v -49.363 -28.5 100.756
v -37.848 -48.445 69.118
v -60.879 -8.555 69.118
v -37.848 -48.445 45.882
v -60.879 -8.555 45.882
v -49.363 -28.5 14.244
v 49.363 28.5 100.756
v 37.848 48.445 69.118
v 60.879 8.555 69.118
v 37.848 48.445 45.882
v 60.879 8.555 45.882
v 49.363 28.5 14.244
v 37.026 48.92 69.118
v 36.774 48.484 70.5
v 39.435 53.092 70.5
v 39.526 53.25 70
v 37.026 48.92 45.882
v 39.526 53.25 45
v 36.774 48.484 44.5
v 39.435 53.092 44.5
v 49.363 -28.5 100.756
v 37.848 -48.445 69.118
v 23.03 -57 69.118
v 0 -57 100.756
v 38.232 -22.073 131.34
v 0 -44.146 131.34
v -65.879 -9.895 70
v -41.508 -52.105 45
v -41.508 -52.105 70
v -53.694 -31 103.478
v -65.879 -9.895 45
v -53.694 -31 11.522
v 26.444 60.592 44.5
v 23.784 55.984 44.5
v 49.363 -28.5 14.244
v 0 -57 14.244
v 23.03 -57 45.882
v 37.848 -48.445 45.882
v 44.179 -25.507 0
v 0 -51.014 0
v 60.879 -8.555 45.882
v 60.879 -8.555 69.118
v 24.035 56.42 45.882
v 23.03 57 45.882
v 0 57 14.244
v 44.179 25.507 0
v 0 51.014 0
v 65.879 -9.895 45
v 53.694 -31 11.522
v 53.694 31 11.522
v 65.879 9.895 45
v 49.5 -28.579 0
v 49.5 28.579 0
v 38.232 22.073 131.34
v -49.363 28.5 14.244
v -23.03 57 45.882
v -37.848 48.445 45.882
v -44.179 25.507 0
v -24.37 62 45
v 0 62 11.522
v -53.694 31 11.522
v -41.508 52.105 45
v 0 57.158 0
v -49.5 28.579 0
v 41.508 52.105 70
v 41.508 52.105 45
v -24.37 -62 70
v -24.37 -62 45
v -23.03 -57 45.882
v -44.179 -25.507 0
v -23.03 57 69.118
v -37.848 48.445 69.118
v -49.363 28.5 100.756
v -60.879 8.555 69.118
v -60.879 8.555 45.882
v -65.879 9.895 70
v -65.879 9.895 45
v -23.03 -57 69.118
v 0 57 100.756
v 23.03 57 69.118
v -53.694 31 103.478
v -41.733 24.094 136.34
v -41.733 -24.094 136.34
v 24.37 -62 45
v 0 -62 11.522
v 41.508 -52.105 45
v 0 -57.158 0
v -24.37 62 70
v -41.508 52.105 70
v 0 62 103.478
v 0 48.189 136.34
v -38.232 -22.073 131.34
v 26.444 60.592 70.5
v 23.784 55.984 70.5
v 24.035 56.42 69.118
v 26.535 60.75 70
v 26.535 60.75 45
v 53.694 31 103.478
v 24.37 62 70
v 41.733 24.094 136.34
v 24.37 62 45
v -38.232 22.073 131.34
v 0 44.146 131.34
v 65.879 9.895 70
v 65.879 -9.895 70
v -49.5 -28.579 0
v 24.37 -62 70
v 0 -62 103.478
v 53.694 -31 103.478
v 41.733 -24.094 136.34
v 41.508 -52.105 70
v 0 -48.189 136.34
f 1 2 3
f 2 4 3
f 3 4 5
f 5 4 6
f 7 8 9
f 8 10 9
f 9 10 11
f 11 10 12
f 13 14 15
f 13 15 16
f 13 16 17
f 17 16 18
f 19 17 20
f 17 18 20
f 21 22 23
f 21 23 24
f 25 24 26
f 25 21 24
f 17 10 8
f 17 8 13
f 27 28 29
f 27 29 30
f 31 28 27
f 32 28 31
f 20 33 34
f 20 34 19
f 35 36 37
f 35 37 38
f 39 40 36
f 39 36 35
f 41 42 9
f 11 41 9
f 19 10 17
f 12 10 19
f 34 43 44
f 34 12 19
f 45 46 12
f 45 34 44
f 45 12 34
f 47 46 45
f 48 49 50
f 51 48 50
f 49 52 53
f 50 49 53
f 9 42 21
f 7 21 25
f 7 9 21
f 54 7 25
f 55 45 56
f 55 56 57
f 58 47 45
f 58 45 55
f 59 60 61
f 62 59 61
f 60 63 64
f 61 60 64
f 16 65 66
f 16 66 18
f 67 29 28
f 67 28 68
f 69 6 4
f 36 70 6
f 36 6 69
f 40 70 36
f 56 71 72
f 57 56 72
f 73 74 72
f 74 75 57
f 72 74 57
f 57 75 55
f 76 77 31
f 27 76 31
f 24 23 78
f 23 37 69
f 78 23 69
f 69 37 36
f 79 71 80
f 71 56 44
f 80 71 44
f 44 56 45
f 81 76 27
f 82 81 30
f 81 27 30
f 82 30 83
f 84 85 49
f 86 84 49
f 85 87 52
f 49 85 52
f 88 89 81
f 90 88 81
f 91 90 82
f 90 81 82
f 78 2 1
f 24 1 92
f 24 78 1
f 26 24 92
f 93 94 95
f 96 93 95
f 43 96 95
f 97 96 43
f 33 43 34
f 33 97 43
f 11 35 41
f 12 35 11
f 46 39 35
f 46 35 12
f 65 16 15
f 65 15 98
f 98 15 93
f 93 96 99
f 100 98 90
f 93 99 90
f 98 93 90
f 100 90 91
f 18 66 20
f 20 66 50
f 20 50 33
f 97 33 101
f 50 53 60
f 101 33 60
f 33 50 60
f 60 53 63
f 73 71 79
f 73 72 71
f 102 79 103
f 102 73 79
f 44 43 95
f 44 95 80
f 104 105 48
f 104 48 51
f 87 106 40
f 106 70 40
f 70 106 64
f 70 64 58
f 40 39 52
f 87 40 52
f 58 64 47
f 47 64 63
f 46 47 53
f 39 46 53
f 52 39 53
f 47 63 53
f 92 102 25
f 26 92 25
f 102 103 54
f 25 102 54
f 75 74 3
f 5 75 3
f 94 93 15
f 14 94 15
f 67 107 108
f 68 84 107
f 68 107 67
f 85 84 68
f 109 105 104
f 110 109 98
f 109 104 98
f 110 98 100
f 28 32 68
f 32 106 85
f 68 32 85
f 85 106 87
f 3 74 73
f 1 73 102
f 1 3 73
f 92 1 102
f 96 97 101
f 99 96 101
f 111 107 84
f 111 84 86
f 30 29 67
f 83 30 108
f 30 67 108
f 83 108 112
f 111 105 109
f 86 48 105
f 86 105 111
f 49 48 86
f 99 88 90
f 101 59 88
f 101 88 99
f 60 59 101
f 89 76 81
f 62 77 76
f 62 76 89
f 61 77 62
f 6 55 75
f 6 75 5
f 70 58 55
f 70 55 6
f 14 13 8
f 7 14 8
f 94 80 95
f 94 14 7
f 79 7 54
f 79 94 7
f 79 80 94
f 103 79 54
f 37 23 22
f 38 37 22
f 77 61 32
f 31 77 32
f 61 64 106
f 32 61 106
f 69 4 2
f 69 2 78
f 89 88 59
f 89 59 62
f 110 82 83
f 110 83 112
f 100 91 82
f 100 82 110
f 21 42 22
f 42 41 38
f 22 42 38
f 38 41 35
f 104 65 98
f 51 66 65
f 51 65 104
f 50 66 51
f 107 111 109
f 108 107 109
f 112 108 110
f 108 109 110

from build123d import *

# Parameters (mm, degrees)
BOSS_EXTRUDE1_DEPTH = 45
BOSS_EXTRUDE1_DRAFT = -20
BOSS_EXTRUDE3_DEPTH = 25
BOSS_EXTRUDE4_DEPTH = 66.34
BOSS_EXTRUDE4_TAPER = 20
SKETCH5_W           = 60
SKETCH5_H           = 136.34
CUT_EXTRUDE4_DEPTH  = 15
CIRPATTERN1_COUNT   = 6
SHELL1_T            = -5
SKETCH6_W           = 15
SKETCH6_H           = 26
CUT_EXTRUDE5_DEPTH  = 10


with BuildPart() as part:
    # Sketch1 → Boss-Extrude1 (with draft: the straight prism first)
    with BuildSketch(Plane.XY):
        Polygon((0, 57.15767665), (-49.5, 28.578838325), (-49.5, -28.578838325), (0, -57.15767665), (49.5, -28.578838325), (49.5, 28.578838325), align=None)
    extrude(amount=BOSS_EXTRUDE1_DEPTH)
    # Boss-Extrude1: the draft: its side faces are tilted about the plane it starts from
    boss_extrude1_sides = [part.faces().sort_by_distance(p)[0] for p in [
        (-24.75, 42.868257487, 22.5),
        (-49.5, 0, 22.5),
        (-24.75, -42.868257487, 22.5),
        (24.75, -42.868257487, 22.5),
        (49.5, 0, 22.5),
        (24.75, 42.868257487, 22.5),
    ]]
    draft(boss_extrude1_sides, Plane.XY, BOSS_EXTRUDE1_DRAFT)

    # Sketch3 → Boss-Extrude3 (add)
    with BuildSketch(Plane.XY.offset(45)):
        Polygon((0, -76.070124796), (65.878660542, -38.035062398), (65.878660542, 38.035062398), (0, 76.070124796), (-65.878660542, 38.035062398), (-65.878660542, -38.035062398), align=None)
    extrude(amount=BOSS_EXTRUDE3_DEPTH)

    # Sketch4 → Boss-Extrude4 (add)
    with BuildSketch(Plane.XY.offset(70)):
        Polygon((65.878660542, -38.035062398), (65.878660542, 38.035062398), (0, 76.070124796), (-65.878660542, 38.035062398), (-65.878660542, -38.035062398), (0, -76.070124796), align=None)
    extrude(amount=BOSS_EXTRUDE4_DEPTH, taper=BOSS_EXTRUDE4_TAPER)

    # Sketch5 → Cut-Extrude4 (cut)
    with BuildSketch(Plane(origin=(0, 77, 0), x_dir=(1, 0, 0), z_dir=(0, 1, 0))):
        with Locations((0, -68.17)):
            Rectangle(SKETCH5_W, SKETCH5_H)
    cut_extrude4 = extrude(amount=-CUT_EXTRUDE4_DEPTH, mode=Mode.SUBTRACT)

    # CirPattern1: Cut-Extrude4 ×6 about axis
    cirpattern1_axis = Axis((0, 0, 0), (0, 0, 1))
    for i in range(1, CIRPATTERN1_COUNT):
        add(cut_extrude4.rotate(cirpattern1_axis, i * 360 / CIRPATTERN1_COUNT), mode=Mode.SUBTRACT)

    # Shell1
    shell1_openings = [part.faces().sort_by_distance(p)[0] for p in [
        (0, 0, 0),
    ]]
    offset(amount=SHELL1_T, openings=shell1_openings, kind=Kind.INTERSECTION)

    # Sketch6 → Cut-Extrude5 (cut)
    with BuildSketch(Plane(origin=(32.939330271, 57.052593597, 0), x_dir=(0.8660254037844417, -0.49999999999999467, 0), z_dir=(0.49999999999999467, 0.8660254037844417, 0))):
        with Locations((0.105187193, -57.5)):
            Rectangle(SKETCH6_W, SKETCH6_H)
    extrude(amount=-CUT_EXTRUDE5_DEPTH, mode=Mode.SUBTRACT)


solid = part.part
